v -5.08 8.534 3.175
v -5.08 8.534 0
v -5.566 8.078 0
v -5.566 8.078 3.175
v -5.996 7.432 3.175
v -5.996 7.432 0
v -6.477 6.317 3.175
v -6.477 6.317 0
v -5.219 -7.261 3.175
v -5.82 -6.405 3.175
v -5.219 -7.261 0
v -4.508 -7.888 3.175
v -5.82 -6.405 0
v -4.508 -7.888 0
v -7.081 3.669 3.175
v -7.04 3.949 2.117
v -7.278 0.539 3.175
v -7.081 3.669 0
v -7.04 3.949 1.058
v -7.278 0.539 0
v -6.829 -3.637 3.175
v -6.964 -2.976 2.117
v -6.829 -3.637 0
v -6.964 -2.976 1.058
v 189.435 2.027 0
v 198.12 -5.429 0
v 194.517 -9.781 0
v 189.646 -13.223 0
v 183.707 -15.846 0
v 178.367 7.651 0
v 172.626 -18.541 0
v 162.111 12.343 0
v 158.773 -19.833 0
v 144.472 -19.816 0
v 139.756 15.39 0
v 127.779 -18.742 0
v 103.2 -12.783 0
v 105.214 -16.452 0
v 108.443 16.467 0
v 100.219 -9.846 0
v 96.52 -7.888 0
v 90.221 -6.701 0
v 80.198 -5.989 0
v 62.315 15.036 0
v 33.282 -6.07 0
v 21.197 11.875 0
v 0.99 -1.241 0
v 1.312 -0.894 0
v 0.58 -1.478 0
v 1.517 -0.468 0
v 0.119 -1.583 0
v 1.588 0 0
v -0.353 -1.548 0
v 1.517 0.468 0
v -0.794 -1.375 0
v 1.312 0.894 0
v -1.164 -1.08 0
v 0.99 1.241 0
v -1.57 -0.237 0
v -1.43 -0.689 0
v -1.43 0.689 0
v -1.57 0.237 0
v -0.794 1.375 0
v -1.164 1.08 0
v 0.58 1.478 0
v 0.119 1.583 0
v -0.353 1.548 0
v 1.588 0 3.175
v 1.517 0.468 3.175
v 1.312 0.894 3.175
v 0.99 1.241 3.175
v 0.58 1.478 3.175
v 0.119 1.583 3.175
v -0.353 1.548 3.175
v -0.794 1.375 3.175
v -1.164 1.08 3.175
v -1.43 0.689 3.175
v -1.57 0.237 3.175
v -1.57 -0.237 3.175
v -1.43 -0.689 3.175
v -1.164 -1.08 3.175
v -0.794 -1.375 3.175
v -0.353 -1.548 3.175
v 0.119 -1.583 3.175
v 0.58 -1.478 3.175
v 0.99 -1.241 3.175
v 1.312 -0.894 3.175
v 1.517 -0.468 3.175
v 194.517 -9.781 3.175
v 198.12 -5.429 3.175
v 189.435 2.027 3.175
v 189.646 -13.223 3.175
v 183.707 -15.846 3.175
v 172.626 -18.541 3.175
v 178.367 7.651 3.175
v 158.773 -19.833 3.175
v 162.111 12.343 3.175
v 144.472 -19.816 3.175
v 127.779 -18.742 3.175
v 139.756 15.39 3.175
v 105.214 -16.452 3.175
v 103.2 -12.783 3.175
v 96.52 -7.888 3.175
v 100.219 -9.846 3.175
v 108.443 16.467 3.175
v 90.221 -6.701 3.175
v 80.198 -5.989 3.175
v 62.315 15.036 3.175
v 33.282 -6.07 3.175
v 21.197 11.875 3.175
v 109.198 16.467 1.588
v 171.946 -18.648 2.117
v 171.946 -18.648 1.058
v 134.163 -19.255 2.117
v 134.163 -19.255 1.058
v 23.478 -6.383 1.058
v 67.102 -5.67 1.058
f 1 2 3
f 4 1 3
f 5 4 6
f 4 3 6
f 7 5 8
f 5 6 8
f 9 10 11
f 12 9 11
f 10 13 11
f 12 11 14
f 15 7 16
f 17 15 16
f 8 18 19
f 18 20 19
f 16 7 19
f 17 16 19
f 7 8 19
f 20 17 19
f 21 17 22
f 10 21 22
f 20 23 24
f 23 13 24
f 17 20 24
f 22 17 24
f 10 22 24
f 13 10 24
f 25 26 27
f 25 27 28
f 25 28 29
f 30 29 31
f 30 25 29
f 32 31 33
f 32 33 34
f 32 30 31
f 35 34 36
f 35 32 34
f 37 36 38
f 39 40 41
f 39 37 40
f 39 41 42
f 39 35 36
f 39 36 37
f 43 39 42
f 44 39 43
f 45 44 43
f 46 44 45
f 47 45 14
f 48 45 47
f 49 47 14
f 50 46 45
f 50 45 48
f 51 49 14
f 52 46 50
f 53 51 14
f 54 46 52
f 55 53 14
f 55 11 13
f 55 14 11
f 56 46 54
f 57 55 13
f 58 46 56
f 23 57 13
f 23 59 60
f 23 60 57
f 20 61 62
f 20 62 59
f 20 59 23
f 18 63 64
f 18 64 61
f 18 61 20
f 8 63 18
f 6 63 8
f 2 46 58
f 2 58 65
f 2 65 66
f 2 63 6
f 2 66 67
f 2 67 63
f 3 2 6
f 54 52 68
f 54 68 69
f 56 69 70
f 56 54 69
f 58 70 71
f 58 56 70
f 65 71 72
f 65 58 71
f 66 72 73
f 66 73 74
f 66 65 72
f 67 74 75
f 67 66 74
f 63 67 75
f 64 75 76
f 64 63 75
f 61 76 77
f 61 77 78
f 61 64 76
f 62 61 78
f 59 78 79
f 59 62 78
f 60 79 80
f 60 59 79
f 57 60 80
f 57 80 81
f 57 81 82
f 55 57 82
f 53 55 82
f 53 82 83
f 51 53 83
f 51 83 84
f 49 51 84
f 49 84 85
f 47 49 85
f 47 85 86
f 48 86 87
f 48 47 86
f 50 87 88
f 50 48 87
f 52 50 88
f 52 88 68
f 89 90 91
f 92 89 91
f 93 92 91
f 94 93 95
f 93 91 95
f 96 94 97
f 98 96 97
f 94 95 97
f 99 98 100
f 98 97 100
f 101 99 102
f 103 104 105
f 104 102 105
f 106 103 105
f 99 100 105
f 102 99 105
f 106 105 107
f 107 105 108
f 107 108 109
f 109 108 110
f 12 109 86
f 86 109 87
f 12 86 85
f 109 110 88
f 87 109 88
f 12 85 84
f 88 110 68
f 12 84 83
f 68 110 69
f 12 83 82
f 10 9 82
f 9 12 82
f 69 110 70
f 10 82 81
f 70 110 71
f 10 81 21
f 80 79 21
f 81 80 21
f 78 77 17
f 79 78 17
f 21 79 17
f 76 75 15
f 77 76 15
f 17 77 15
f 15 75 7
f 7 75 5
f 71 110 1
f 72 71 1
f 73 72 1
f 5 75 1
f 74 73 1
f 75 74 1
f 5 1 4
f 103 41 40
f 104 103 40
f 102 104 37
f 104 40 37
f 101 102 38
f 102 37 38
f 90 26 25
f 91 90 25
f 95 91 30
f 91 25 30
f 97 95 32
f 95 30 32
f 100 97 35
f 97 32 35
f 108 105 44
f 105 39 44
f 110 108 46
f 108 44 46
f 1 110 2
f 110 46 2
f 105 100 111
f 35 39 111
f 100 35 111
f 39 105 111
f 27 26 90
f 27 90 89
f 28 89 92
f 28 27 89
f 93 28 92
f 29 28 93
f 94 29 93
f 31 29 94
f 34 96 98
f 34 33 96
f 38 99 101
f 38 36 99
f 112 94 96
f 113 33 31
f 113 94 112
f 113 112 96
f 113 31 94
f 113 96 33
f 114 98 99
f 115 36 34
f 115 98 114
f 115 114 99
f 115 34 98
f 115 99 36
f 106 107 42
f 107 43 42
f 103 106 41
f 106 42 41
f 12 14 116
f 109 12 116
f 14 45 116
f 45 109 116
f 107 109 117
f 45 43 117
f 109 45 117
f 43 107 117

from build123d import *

# Parameters (mm, degrees)
F0_R     = 1.5875
F1_DEPTH = 3.175


with BuildPart() as f1:
    # F0 (on Top) → F1 (new body)
    with BuildSketch(Plane.XY):
        with BuildLine():
            add(Edge.make_bspline(
                [(198.12, -5.4292259738), (184.5660527897, -28.0191320926), (122.930863434, -17.8945506787), (105.2140353388, -16.4520314588)],
                knots=[0, 0, 0, 0, 93.5575785834, 93.5575785834, 93.5575785834, 93.5575785834], degree=3))
            add(Edge.make_bspline(
                [(198.12, -5.4292259738), (182.5063164984, 12.370372497), (112.3219469009, 20.9906558785), (10.5094795336, 11.4740038024), (-5.08, 8.5340185354)],
                knots=[0, 0, 0, 0, 0.4720497101, 1, 1, 1, 1], degree=3))
            add(Edge.make_bspline(
                [(-5.08, 8.5340185354), (-7.942054389, 6.5714671539), (-8.2691467515, -5.434848902), (-4.5075895879, -7.8880380124)],
                knots=[0, 0, 0, 0, 16.4320295441, 16.4320295441, 16.4320295441, 16.4320295441], degree=3))
            add(Edge.make_bspline(
                [(-4.5075895879, -7.8880380124), (5.710196705, -6.7006219788), (84.1534286737, -3.4922137856), (96.52, -7.8880380124)],
                knots=[0, 0, 0, 0, 101.0275895879, 101.0275895879, 101.0275895879, 101.0275895879], degree=3))
            ThreePointArc((96.52, -7.8880380124), (101.8163134503, -11.2063241586), (105.2140353388, -16.4520314588))
        make_face()
        Circle(F0_R, mode=Mode.SUBTRACT)
    extrude(amount=F1_DEPTH)


solid = f1.part
